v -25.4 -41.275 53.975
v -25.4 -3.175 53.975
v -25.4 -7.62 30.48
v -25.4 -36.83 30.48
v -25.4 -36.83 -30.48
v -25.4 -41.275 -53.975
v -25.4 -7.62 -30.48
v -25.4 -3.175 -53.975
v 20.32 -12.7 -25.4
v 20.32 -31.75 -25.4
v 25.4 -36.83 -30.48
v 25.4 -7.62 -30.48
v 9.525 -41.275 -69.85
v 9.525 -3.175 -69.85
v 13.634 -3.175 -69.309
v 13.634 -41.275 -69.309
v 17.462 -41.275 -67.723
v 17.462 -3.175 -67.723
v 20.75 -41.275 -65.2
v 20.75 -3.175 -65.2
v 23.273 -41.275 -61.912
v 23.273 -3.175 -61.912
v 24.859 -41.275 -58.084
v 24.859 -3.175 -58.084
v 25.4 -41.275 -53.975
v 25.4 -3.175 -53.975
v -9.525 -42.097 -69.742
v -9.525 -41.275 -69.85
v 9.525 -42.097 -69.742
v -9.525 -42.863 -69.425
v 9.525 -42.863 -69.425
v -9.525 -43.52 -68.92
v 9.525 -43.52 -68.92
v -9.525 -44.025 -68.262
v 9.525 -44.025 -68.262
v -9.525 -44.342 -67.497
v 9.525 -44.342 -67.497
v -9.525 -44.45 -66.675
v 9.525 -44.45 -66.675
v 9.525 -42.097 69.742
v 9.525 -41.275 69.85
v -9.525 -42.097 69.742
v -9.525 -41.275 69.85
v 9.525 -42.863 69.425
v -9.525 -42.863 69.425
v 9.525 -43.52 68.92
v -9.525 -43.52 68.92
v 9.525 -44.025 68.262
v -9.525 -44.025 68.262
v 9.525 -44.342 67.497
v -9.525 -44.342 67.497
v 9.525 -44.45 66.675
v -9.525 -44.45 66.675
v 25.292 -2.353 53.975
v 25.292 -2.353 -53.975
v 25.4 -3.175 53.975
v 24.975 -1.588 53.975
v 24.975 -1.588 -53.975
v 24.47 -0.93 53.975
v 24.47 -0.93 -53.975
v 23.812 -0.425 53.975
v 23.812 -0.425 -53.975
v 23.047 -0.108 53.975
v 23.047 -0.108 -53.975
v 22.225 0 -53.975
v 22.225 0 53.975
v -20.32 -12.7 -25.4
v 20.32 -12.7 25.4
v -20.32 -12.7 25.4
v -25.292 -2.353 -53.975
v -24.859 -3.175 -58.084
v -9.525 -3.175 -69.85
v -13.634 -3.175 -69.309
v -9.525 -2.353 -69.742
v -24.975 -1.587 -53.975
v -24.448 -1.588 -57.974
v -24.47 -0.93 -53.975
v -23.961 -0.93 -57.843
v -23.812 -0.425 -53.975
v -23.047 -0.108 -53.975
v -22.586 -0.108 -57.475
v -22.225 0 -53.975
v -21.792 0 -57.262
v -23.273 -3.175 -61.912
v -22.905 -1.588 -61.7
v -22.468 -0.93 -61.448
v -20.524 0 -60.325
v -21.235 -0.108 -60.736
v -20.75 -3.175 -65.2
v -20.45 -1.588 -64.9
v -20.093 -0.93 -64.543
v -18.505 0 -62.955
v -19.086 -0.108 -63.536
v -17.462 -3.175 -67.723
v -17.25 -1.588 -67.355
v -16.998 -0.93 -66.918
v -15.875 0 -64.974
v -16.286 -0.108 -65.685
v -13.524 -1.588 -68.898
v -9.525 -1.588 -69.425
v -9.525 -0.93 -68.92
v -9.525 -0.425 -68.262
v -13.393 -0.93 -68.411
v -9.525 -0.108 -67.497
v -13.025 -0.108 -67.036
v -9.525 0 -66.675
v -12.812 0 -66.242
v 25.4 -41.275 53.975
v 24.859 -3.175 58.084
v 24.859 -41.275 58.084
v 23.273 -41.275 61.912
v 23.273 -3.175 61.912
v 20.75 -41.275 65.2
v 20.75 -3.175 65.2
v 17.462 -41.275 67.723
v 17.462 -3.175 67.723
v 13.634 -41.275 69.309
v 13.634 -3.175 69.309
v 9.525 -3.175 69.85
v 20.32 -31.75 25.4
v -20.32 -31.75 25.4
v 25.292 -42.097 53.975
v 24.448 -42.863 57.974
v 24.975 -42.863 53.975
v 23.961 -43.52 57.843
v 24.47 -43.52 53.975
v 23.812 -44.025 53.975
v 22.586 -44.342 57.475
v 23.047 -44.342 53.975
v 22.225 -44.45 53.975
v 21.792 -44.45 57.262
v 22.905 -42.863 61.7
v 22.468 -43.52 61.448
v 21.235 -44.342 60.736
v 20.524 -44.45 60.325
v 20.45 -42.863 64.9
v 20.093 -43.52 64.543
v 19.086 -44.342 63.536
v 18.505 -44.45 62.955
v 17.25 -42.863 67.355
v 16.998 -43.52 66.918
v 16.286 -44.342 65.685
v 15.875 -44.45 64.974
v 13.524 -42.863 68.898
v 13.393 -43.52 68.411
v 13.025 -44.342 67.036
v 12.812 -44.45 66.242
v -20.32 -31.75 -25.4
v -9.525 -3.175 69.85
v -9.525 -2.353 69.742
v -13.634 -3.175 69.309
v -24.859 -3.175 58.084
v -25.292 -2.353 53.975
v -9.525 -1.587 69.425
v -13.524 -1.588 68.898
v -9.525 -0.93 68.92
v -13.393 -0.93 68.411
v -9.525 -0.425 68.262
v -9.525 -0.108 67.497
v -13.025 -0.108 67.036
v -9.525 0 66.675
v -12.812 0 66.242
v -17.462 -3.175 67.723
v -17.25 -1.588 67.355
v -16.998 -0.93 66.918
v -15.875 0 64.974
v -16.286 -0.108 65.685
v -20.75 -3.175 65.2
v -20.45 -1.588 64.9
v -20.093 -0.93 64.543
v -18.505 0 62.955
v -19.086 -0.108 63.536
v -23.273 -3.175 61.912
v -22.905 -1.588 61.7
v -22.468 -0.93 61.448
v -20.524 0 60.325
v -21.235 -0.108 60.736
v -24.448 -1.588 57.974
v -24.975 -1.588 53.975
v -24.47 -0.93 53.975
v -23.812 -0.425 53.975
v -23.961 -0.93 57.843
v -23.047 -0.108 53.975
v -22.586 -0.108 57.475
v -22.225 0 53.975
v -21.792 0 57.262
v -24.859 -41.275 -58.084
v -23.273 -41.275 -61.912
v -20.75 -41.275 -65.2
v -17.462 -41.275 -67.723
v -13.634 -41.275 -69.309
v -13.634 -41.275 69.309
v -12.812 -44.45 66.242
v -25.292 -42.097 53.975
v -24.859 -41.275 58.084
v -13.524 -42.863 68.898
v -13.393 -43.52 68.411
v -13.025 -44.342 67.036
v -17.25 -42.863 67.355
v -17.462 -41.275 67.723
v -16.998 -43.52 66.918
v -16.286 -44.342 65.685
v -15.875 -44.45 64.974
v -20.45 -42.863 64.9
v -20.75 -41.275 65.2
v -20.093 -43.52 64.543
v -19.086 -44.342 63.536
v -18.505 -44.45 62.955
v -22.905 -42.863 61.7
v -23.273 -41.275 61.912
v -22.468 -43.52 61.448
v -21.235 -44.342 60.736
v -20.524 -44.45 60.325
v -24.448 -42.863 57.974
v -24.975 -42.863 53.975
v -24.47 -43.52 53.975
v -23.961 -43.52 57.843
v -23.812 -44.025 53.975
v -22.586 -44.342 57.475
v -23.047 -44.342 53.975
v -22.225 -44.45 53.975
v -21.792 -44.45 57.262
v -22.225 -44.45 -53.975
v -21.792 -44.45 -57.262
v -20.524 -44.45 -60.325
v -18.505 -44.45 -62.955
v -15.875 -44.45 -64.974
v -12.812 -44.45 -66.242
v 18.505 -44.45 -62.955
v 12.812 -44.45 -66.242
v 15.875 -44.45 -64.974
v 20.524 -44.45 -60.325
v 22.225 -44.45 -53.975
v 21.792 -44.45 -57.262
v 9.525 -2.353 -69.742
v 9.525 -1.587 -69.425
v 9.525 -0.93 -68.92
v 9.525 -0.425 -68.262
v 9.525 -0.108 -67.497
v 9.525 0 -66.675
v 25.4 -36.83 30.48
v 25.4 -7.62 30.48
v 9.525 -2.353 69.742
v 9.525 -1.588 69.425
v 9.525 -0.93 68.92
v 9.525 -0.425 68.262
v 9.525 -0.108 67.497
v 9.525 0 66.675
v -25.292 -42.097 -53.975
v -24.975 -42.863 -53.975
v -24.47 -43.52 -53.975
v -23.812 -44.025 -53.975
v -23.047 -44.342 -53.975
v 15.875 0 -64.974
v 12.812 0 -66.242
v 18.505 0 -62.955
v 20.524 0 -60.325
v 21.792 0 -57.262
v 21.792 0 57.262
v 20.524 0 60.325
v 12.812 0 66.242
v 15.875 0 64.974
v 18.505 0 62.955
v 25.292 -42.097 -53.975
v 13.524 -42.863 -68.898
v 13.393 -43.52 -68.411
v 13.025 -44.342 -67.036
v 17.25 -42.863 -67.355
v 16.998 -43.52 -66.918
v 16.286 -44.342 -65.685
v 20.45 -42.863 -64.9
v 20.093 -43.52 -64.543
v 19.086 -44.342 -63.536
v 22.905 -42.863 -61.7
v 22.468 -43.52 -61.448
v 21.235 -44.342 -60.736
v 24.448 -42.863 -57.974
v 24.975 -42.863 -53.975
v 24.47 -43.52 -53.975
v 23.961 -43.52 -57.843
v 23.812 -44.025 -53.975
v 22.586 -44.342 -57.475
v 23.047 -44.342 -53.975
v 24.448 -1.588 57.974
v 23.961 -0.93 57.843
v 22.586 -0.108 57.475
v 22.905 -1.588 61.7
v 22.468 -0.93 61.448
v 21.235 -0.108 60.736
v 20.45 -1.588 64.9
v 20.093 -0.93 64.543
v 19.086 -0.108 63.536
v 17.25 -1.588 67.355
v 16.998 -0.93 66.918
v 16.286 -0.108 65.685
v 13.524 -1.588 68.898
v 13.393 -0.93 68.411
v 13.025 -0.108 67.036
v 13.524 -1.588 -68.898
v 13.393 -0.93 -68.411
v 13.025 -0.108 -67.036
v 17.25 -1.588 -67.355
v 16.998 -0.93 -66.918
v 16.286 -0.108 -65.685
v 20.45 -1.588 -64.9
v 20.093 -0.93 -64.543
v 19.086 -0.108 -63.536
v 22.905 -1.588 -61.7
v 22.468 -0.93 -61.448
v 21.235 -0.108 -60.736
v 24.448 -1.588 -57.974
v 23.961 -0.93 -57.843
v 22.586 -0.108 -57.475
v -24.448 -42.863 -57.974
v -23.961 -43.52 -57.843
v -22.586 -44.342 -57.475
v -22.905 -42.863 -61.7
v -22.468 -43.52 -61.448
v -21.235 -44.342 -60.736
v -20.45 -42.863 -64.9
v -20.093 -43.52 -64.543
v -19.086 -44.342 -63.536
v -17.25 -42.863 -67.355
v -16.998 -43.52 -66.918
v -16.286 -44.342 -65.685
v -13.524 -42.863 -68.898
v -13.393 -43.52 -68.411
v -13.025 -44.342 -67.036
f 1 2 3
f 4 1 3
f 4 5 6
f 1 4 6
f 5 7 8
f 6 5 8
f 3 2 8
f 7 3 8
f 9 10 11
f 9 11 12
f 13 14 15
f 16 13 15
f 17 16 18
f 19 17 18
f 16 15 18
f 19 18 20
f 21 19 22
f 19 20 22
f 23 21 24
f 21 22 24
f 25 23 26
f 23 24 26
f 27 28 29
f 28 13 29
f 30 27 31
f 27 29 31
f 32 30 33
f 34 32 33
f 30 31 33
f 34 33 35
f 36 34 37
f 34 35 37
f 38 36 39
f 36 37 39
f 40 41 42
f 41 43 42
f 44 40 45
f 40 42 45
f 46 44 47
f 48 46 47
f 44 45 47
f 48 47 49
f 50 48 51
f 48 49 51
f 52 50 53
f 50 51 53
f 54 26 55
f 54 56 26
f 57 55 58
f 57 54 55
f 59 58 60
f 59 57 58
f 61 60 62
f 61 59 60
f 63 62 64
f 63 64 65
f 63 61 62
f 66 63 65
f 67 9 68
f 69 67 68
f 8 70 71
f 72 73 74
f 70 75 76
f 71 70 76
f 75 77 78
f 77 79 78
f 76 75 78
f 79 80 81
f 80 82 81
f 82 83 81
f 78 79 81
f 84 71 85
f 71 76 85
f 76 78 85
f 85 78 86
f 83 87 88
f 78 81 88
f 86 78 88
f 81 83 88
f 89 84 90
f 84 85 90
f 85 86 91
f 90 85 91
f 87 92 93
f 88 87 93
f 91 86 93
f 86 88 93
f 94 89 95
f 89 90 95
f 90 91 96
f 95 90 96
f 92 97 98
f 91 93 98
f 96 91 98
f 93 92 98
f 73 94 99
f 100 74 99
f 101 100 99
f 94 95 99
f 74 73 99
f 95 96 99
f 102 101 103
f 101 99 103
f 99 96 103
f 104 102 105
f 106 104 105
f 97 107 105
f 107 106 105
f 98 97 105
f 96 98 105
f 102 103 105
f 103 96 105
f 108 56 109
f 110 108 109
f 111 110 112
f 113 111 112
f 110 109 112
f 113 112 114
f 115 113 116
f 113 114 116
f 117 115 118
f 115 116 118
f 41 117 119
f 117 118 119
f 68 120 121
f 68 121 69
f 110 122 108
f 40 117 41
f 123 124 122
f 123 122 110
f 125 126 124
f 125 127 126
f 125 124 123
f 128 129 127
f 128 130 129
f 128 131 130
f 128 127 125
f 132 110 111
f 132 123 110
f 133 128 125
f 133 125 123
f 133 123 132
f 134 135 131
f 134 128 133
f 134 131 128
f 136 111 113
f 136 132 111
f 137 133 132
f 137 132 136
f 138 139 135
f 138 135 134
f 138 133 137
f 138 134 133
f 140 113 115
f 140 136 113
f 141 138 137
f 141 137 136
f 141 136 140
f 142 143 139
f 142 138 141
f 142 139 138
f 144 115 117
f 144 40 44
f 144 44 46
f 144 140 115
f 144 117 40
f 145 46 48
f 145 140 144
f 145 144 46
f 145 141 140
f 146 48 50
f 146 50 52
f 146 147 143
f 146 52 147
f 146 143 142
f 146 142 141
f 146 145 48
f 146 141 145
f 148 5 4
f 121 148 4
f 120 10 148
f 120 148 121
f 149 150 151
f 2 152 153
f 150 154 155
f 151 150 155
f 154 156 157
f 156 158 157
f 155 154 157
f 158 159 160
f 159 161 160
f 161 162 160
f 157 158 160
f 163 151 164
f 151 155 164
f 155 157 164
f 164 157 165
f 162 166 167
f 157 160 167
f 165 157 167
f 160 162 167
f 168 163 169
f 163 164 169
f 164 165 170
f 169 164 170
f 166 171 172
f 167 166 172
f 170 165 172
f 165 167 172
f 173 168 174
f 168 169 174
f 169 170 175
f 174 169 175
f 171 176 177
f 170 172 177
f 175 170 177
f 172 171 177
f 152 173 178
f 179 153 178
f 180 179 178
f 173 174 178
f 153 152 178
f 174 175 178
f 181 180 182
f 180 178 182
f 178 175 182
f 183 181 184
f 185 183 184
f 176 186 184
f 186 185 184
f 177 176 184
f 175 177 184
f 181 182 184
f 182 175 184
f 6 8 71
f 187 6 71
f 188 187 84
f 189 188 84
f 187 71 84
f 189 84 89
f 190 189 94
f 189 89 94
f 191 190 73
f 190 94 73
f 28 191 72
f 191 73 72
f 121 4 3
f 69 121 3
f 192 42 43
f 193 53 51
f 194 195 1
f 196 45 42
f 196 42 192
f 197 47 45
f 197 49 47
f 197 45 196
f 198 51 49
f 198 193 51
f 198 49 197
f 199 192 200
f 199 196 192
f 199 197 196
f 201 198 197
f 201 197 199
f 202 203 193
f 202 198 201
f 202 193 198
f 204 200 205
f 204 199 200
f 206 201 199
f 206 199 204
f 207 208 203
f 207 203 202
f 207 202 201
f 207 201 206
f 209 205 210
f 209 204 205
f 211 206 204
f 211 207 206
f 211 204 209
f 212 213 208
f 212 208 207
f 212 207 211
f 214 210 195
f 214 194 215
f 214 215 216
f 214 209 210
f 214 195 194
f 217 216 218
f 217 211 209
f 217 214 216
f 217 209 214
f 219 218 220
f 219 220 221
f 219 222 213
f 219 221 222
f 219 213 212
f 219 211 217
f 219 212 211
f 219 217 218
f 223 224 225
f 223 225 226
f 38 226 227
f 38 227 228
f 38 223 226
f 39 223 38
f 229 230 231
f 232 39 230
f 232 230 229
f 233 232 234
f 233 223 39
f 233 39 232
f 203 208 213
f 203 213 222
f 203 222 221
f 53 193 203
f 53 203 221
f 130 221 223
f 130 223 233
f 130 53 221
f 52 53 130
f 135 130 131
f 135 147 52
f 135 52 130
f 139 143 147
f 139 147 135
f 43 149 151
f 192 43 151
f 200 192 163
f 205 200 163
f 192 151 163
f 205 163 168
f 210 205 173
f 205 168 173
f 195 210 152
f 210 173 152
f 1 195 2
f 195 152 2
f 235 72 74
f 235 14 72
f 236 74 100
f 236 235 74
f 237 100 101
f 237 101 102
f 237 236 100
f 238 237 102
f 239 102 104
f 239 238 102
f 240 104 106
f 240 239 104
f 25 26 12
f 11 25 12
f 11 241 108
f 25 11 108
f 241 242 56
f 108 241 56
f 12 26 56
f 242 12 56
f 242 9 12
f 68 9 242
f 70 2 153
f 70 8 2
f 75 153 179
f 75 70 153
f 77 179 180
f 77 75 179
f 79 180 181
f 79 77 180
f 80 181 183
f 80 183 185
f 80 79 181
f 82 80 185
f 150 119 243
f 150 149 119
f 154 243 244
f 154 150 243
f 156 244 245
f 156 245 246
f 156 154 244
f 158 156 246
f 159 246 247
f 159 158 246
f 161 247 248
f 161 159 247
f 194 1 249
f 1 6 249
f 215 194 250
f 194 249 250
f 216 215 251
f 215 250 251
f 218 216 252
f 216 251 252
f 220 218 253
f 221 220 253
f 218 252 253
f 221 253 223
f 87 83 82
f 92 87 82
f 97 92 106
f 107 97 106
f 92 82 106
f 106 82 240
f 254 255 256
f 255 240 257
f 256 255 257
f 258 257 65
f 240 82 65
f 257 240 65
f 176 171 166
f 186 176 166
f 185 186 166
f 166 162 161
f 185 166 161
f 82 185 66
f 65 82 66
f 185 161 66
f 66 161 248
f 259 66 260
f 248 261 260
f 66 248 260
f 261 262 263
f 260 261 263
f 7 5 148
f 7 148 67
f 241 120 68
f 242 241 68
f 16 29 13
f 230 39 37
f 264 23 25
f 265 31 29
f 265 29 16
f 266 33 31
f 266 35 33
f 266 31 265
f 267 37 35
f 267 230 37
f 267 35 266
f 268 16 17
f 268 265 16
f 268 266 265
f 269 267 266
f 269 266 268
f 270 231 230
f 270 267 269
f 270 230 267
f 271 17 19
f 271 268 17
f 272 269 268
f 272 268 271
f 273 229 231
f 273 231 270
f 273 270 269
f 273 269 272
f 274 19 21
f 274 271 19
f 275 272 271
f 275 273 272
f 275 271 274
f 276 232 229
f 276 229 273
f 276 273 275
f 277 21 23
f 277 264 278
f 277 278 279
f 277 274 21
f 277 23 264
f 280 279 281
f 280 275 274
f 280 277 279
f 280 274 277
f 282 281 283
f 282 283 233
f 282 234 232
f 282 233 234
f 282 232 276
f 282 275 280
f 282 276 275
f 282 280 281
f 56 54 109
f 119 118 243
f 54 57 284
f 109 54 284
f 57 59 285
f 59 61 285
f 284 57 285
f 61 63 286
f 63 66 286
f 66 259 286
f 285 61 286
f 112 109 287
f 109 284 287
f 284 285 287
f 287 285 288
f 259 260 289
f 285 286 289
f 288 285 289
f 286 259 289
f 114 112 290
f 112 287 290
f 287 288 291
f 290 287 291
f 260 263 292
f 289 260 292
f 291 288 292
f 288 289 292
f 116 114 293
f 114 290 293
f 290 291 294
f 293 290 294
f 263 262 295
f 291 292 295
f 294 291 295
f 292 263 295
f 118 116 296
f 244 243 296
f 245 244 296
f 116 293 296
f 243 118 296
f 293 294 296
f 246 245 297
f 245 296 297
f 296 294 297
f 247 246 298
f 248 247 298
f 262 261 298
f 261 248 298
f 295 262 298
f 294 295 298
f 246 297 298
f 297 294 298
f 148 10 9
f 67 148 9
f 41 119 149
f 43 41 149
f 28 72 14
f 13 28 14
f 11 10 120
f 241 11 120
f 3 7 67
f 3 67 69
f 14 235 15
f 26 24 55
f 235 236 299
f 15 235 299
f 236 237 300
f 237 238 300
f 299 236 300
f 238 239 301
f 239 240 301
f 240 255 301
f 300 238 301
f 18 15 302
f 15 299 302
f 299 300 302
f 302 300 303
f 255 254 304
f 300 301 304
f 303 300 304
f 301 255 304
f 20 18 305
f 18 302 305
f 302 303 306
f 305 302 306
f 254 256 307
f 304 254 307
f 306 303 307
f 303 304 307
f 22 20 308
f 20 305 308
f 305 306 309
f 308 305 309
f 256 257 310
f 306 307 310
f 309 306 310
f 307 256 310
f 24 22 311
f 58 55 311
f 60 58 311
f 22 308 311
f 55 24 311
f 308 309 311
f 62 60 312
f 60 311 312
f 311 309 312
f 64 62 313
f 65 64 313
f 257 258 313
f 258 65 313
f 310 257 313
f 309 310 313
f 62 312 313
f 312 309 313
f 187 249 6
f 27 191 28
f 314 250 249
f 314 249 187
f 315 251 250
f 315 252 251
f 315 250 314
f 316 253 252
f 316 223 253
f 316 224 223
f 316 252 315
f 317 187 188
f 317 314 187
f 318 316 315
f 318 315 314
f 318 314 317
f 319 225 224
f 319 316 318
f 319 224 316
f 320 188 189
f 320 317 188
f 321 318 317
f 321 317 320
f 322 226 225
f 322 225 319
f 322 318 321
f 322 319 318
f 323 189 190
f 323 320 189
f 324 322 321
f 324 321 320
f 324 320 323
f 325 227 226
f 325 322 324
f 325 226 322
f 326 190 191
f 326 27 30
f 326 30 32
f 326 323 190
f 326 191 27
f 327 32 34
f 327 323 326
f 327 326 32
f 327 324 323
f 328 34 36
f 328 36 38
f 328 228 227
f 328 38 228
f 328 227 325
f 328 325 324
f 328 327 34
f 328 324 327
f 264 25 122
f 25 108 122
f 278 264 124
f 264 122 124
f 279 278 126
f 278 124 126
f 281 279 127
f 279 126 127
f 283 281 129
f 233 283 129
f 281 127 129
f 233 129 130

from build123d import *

# Parameters (mm, degrees)
F1_DEPTH = 44.45
F2_R     = 3.175
F3_W     = 19.05
F3_H     = 50.8
F4_DEPTH = 50.801
F5_SIZE  = 5.08


with BuildPart() as f1:
    # F0 (on Front) → F1 (new body)
    with BuildSketch(Plane.XZ):
        with BuildLine():
            ThreePointArc((25.4, 53.975), (20.75032, 65.20032), (9.525, 69.85))
            Line((9.525, 69.85), (-9.525, 69.85))
            ThreePointArc((-9.525, 69.85), (-20.75032, 65.20032), (-25.4, 53.975))
            Line((-25.4, 53.975), (-25.4, -53.975))
            ThreePointArc((-25.4, -53.975), (-20.75032, -65.20032), (-9.525, -69.85))
            Line((-9.525, -69.85), (9.525, -69.85))
            ThreePointArc((9.525, -69.85), (20.75032, -65.20032), (25.4, -53.975))
            Line((25.4, -53.975), (25.4, 53.975))
        make_face()
    extrude(amount=F1_DEPTH)

    # F2
    f2_edges = [f1.edges().sort_by_distance(p)[0] for p in [
        (20.75032, -44.45, 65.20032),
        (0, -44.45, 69.85),
        (-20.75032, -44.45, 65.20032),
        (-25.4, -44.45, 0),
        (-20.75032, -44.45, -65.20032),
        (0, -44.45, -69.85),
        (20.75032, -44.45, -65.20032),
        (25.4, -44.45, 0),
        (20.75032, 0, 65.20032),
        (0, 0, 69.85),
        (-20.75032, 0, 65.20032),
        (-25.4, 0, 0),
        (-20.75032, 0, -65.20032),
        (0, 0, -69.85),
        (20.75032, 0, -65.20032),
        (25.4, 0, 0),
    ]]
    fillet(f2_edges, radius=F2_R)

    # F3 (on face) → F4 (cut, through all)
    with BuildSketch(Plane.YZ.offset(25.4)):
        with Locations((-22.225, 0)):
            Rectangle(F3_W, F3_H)
    extrude(amount=-F4_DEPTH, mode=Mode.SUBTRACT)

    # F5
    f5_edges = [f1.edges().sort_by_distance(p)[0] for p in [
        (25.4, -31.75, 0),
        (25.4, -22.225, 25.4),
        (25.4, -12.7, 0),
        (25.4, -22.225, -25.4),
        (-25.4, -22.225, 25.4),
        (-25.4, -31.75, 0),
        (-25.4, -22.225, -25.4),
        (-25.4, -12.7, 0),
    ]]
    chamfer(f5_edges, length=F5_SIZE)


solid = f1.part
